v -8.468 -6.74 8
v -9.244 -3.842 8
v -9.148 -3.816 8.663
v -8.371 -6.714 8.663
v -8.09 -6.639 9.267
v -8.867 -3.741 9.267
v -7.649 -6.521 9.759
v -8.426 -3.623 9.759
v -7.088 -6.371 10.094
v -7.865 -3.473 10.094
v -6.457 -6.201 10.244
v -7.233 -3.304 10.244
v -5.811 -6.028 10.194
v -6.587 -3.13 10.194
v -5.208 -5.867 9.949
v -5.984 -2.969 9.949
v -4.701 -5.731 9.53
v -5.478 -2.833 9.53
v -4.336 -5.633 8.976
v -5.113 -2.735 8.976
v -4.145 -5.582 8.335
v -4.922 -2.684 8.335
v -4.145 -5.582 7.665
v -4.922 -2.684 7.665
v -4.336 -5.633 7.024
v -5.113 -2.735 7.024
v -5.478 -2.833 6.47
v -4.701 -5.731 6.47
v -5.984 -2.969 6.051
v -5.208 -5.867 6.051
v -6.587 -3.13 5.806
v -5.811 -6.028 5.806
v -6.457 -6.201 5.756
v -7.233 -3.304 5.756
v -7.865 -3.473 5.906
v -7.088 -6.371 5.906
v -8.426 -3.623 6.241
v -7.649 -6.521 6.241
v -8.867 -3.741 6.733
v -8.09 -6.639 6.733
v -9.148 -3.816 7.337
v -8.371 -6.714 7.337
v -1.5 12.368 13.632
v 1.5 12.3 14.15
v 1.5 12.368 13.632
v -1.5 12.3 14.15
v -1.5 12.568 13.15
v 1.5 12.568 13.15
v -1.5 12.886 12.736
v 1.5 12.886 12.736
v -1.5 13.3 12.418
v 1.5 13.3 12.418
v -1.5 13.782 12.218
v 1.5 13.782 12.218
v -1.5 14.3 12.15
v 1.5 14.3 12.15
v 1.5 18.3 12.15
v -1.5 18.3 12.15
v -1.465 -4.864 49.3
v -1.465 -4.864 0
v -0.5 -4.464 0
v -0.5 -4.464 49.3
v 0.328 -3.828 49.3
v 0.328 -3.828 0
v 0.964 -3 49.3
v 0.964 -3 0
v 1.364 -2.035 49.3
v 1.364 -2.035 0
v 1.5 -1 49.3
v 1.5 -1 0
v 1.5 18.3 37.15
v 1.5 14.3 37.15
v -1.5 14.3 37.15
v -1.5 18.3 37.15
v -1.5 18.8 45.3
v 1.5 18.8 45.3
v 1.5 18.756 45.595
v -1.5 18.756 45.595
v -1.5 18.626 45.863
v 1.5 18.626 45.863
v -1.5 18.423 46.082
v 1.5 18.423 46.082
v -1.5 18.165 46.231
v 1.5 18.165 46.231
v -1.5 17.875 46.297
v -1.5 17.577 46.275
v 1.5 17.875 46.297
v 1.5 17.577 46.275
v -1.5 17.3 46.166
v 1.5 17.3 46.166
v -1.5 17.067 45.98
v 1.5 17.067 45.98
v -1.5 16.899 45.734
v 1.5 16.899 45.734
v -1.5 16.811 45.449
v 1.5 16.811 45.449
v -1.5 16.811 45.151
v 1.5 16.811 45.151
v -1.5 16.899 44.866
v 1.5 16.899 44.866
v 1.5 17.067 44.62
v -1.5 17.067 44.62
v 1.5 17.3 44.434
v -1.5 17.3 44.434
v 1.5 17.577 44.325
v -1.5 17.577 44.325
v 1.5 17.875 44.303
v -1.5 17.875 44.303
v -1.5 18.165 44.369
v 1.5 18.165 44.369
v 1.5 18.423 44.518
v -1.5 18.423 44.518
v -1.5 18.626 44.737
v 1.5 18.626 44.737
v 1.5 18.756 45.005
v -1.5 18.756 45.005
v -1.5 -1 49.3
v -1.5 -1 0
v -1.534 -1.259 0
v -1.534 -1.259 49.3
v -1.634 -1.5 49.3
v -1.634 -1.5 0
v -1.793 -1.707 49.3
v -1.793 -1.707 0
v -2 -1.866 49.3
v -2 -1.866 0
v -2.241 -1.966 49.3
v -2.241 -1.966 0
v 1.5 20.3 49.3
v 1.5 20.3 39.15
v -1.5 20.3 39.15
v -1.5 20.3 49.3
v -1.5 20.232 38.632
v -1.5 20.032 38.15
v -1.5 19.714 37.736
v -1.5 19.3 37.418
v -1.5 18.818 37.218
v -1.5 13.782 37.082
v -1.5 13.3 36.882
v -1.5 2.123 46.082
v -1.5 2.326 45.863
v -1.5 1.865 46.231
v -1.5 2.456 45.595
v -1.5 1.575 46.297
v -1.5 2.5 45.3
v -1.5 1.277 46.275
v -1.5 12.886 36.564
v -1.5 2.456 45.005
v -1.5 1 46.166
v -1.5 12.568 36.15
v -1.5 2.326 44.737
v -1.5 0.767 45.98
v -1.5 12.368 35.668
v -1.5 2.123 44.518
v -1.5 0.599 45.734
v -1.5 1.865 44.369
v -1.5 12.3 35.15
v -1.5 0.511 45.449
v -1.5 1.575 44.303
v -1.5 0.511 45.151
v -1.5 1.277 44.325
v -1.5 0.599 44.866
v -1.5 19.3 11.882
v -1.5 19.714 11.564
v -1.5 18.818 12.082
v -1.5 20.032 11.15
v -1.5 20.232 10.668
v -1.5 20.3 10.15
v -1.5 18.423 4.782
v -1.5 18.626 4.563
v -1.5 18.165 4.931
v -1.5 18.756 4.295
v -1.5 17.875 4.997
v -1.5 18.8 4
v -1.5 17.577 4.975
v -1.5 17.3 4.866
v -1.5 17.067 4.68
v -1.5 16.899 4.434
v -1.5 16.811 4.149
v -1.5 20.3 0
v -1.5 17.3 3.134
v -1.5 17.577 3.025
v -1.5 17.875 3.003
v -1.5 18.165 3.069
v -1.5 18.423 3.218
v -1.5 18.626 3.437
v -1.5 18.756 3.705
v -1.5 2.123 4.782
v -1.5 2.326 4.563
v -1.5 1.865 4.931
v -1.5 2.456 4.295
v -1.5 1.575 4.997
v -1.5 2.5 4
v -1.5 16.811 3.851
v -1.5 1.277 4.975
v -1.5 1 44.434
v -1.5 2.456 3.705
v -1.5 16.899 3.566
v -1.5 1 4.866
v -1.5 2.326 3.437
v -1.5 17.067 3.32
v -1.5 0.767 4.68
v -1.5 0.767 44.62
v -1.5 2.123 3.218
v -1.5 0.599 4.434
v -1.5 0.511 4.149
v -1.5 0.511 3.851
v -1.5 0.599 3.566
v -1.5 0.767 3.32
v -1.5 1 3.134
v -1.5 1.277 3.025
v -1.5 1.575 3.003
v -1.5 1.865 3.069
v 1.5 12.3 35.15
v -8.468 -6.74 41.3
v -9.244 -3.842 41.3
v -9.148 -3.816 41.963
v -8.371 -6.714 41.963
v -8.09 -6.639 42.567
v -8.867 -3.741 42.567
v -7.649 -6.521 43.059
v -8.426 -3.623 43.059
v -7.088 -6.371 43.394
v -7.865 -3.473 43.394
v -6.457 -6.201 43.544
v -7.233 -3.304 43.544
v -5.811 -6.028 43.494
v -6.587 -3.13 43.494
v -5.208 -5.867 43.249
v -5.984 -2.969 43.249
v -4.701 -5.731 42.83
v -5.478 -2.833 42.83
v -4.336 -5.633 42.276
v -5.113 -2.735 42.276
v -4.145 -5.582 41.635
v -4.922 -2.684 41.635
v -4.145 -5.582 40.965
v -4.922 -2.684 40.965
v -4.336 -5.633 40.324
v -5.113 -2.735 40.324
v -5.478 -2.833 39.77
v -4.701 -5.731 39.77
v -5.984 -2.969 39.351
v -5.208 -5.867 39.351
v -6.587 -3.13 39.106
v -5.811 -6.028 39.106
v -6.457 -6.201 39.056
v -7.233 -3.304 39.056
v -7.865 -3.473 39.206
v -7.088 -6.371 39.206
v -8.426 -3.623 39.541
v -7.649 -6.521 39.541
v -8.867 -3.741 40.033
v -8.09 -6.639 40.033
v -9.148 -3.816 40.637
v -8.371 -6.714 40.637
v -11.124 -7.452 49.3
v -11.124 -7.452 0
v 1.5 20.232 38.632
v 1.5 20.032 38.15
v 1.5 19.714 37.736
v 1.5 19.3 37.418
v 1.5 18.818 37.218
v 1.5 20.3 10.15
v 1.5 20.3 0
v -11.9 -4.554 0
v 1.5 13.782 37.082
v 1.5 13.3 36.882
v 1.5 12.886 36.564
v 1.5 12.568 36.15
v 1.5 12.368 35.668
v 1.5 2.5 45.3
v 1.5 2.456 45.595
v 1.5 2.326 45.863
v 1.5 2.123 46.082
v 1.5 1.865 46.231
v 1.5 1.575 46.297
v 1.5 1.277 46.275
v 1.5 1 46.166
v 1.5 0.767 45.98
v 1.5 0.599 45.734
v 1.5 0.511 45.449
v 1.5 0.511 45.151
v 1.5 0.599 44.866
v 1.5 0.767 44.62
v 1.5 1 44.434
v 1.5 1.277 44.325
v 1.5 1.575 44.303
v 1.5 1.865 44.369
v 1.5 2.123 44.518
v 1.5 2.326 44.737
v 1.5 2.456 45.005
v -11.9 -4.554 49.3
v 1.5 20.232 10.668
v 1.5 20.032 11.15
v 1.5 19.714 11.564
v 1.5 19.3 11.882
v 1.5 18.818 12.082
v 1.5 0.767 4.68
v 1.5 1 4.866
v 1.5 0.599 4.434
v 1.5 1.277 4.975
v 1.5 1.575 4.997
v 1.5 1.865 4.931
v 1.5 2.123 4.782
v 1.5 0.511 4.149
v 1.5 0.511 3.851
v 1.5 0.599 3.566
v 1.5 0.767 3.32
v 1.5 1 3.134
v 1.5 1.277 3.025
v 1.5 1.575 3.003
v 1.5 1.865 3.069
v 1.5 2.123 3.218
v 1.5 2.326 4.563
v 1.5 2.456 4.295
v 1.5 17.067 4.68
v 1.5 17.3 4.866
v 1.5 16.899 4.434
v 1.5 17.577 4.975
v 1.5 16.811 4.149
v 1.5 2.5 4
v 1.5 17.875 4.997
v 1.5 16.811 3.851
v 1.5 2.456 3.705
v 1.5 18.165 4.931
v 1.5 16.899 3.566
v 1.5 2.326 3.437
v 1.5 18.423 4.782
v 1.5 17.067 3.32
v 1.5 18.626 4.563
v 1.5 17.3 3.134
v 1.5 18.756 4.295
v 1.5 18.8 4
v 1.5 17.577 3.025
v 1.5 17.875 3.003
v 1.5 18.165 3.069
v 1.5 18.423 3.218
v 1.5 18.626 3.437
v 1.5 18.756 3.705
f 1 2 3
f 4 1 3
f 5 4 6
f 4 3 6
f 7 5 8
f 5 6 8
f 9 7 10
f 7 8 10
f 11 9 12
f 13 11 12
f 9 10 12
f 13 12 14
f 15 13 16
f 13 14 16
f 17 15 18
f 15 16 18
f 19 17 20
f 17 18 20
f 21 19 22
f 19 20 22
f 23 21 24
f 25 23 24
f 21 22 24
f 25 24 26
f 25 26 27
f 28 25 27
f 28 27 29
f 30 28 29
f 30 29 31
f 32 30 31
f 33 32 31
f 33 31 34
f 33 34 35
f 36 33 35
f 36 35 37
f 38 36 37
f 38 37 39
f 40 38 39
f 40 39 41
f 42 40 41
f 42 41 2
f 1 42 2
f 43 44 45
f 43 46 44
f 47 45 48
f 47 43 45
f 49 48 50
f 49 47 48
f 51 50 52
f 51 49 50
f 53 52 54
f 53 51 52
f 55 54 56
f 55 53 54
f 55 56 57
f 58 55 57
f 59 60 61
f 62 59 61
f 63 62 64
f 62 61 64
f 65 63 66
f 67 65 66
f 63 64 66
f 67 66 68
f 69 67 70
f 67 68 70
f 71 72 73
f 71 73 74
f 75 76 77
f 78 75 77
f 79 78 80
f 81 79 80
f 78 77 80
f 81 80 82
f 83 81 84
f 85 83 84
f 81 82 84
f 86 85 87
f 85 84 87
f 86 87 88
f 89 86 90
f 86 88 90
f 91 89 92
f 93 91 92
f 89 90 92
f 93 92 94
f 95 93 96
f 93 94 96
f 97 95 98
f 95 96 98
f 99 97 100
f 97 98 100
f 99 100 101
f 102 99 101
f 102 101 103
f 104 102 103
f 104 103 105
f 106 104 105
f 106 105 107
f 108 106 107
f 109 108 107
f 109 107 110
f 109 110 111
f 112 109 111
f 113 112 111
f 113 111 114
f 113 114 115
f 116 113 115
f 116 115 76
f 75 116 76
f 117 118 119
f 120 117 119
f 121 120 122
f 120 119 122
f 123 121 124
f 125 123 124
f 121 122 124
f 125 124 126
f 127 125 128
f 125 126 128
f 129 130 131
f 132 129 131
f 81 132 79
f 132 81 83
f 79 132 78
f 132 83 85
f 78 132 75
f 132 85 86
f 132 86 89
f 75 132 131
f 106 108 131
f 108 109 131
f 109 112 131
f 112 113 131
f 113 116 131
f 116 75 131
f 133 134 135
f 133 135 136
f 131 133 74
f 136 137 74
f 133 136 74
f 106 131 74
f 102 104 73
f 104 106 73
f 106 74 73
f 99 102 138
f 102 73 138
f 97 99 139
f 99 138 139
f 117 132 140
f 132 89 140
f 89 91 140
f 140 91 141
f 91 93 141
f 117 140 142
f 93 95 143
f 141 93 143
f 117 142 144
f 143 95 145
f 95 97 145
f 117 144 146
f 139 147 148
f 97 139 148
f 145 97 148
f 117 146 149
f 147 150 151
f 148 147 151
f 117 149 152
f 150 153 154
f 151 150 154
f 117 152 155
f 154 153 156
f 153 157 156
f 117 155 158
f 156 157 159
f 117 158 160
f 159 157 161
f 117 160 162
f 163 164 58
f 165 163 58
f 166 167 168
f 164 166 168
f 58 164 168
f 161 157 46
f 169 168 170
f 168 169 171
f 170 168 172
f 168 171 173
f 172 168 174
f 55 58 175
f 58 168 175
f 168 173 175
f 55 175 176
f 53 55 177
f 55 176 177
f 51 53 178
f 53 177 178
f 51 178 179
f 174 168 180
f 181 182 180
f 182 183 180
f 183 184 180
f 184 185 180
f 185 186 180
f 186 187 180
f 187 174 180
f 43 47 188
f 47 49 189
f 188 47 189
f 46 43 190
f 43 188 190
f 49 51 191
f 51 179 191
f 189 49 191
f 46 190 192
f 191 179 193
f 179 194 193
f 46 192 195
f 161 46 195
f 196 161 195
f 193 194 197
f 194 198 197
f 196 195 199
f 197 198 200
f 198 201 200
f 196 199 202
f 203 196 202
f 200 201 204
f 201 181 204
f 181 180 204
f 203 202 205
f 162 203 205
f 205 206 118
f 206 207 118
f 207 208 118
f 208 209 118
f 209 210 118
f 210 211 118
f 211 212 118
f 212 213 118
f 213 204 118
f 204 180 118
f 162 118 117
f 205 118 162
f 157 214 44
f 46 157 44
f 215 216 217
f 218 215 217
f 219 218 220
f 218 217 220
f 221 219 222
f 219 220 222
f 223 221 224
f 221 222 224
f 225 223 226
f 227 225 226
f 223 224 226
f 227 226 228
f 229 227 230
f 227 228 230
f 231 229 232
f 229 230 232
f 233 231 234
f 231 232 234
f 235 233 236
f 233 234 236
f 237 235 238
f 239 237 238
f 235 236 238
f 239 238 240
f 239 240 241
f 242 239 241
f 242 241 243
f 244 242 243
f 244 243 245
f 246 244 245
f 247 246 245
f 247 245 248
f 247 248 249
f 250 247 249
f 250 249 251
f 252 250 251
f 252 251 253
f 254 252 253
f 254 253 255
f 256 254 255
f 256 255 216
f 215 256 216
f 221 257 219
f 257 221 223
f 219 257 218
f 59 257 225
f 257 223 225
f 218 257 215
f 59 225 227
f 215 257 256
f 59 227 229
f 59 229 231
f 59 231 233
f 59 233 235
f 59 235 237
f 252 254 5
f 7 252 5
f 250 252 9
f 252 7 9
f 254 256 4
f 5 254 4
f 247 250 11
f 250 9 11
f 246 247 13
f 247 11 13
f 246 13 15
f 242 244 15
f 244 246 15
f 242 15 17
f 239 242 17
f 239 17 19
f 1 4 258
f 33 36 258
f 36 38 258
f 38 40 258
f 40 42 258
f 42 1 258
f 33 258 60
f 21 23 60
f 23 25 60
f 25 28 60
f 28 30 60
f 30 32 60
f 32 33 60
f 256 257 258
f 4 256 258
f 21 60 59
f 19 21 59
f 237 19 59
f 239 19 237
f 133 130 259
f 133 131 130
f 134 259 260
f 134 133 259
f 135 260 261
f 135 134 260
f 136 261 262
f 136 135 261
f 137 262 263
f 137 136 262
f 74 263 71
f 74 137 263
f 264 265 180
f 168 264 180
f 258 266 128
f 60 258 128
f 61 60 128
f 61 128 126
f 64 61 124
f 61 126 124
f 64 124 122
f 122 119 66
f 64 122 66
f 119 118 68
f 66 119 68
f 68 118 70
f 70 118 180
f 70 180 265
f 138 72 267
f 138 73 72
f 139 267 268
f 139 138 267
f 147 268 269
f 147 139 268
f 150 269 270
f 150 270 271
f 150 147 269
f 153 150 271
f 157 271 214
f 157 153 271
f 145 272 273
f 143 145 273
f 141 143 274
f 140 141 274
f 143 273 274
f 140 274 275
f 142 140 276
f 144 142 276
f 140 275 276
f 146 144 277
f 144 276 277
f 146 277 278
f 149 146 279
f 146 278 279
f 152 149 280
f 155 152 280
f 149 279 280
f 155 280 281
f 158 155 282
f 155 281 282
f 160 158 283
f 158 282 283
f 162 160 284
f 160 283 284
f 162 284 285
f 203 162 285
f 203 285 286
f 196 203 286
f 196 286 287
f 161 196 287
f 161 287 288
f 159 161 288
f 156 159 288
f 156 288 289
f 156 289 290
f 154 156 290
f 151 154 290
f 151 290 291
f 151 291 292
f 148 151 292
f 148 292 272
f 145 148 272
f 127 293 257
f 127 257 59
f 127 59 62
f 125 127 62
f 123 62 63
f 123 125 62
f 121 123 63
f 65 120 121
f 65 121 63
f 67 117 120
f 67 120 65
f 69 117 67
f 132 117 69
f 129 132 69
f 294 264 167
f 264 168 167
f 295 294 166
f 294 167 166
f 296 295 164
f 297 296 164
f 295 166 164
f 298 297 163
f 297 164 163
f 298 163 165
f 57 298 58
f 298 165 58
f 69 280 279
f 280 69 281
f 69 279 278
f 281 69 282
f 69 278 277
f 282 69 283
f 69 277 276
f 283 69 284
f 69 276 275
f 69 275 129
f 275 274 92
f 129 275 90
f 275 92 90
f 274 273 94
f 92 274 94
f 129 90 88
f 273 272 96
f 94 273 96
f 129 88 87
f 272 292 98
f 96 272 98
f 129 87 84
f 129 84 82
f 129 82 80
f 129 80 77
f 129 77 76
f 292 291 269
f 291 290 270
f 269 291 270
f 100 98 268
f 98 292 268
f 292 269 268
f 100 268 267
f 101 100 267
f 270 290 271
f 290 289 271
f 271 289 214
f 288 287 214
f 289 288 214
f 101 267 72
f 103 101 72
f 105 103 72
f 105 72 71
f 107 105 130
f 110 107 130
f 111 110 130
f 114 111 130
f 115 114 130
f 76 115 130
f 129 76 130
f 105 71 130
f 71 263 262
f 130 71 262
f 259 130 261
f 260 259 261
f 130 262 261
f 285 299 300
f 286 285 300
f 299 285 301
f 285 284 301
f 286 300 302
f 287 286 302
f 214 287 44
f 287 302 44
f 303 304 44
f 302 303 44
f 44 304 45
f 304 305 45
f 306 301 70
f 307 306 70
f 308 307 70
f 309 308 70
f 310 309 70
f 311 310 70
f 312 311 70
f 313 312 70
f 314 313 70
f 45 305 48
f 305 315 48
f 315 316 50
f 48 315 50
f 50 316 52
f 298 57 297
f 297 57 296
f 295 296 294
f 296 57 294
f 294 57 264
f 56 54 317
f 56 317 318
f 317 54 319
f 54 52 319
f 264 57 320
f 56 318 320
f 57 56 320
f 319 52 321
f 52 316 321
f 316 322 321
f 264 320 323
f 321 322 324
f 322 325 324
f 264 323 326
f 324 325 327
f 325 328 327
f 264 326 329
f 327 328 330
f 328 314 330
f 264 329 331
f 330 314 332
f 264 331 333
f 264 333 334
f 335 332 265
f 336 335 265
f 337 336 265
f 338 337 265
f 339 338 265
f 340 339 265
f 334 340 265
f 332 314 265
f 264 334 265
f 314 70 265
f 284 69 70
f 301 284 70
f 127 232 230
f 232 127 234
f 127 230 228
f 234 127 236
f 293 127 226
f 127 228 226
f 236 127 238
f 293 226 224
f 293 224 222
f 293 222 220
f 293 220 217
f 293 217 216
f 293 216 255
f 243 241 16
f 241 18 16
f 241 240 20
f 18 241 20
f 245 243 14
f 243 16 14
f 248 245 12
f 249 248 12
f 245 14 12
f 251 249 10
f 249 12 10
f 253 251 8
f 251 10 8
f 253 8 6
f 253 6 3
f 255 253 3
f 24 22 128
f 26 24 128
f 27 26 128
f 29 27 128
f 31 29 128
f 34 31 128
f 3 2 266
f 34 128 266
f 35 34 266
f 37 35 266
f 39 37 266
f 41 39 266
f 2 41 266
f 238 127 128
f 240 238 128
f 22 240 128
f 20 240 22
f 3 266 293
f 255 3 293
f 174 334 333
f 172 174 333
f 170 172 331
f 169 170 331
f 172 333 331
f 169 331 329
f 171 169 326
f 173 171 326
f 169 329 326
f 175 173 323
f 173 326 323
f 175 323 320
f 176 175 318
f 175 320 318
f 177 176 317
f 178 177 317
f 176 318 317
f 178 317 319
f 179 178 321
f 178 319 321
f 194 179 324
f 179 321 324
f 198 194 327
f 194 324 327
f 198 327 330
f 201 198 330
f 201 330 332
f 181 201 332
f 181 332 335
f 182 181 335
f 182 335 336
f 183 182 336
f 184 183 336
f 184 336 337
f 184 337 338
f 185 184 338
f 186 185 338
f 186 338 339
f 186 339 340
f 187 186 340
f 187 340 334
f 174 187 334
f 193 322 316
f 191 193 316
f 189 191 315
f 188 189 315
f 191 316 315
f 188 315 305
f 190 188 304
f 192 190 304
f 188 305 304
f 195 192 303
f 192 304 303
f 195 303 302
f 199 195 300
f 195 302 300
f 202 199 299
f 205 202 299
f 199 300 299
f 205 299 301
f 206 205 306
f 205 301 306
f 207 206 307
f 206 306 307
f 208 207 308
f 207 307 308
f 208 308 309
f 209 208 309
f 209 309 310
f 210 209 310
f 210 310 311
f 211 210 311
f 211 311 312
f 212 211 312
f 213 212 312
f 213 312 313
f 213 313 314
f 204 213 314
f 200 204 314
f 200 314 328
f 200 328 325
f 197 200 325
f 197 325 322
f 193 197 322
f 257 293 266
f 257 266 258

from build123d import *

# Parameters (mm, degrees)
BOSS_EXTRUDE2_DEPTH = 49.3
SKETCH3_R           = 1
CUT_EXTRUDE1_DEPTH  = 55.974100913
SKETCH4_R           = 2.25
CUT_EXTRUDE2_DEPTH  = 56.188642368
SKETCH5_W           = 25
SKETCH5_H           = 8
CUT_EXTRUDE3_DEPTH  = 55.974100913
FILLET1_R           = 2


with BuildPart() as part:
    # Sketch2 → Boss-Extrude2 (new body)
    with BuildSketch(Plane.XY):
        with BuildLine():
            Line((-2.241180955, -1.965925826), (-11.900439218, -4.554116277))
            Line((-11.900439218, -4.554116277), (-11.123982082, -7.451893756))
            Line((-11.123982082, -7.451893756), (-1.46472382, -4.863703305))
            ThreePointArc((-1.46472382, -4.863703305), (0.673413361, -3.435045716), (1.5, -1))
            Line((1.5, -1), (1.5, 20.3))
            Line((1.5, 20.3), (-1.5, 20.3))
            Line((-1.5, 20.3), (-1.5, -1))
            ThreePointArc((-1.5, -1), (-1.70664666, -1.608761429), (-2.241180955, -1.965925826))
        make_face()
    extrude(amount=BOSS_EXTRUDE2_DEPTH)

    # Sketch3 → Cut-Extrude1 (cut, through all)
    with BuildSketch(Plane(origin=(1.5, 0, 0), x_dir=(0, 0, -1), z_dir=(1, 0, 0))):
        with Locations(Location((-45.3, 17.8, 0), (0, 0, 90))):
            Circle(SKETCH3_R)
        with Locations(Location((-4, 17.8, 0), (0, 0, 90))):
            Circle(SKETCH3_R)
        with Locations(Location((-4, 1.5, 0), (0, 0, 90))):
            Circle(SKETCH3_R)
        with Locations(Location((-45.3, 1.5, 0), (0, 0, 90))):
            Circle(SKETCH3_R)
    extrude(amount=-CUT_EXTRUDE1_DEPTH, mode=Mode.SUBTRACT)

    # Sketch4 → Cut-Extrude2 (cut, through all)
    with BuildSketch(Plane(origin=(0.3413508, -1.273938528, 0), x_dir=(0.96592582628907, 0.25881904510251463, 0), z_dir=(-0.25881904510251463, 0.96592582628907, 0))):
        with Locations(Location((-7.673633611, -8, 0), (0, 0, 180))):
            Circle(SKETCH4_R)
        with Locations(Location((-7.673633611, -41.3, 0), (0, 0, 180))):
            Circle(SKETCH4_R)
    extrude(amount=-CUT_EXTRUDE2_DEPTH, mode=Mode.SUBTRACT)

    # Sketch5 → Cut-Extrude3 (cut, through all)
    with BuildSketch(Plane(origin=(1.5, 0, 0), x_dir=(0, 0, -1), z_dir=(1, 0, 0))):
        with Locations((-24.65, 16.3)):
            Rectangle(SKETCH5_W, SKETCH5_H)
    extrude(amount=-CUT_EXTRUDE3_DEPTH, mode=Mode.SUBTRACT)

    # Fillet1
    fillet1_edges = [part.edges().sort_by_distance(p)[0] for p in [
        (0, 20.3, 12.15),
        (0, 20.3, 37.15),
        (0, 12.3, 12.15),
        (0, 12.3, 37.15),
    ]]
    fillet(fillet1_edges, radius=FILLET1_R)


solid = part.part
